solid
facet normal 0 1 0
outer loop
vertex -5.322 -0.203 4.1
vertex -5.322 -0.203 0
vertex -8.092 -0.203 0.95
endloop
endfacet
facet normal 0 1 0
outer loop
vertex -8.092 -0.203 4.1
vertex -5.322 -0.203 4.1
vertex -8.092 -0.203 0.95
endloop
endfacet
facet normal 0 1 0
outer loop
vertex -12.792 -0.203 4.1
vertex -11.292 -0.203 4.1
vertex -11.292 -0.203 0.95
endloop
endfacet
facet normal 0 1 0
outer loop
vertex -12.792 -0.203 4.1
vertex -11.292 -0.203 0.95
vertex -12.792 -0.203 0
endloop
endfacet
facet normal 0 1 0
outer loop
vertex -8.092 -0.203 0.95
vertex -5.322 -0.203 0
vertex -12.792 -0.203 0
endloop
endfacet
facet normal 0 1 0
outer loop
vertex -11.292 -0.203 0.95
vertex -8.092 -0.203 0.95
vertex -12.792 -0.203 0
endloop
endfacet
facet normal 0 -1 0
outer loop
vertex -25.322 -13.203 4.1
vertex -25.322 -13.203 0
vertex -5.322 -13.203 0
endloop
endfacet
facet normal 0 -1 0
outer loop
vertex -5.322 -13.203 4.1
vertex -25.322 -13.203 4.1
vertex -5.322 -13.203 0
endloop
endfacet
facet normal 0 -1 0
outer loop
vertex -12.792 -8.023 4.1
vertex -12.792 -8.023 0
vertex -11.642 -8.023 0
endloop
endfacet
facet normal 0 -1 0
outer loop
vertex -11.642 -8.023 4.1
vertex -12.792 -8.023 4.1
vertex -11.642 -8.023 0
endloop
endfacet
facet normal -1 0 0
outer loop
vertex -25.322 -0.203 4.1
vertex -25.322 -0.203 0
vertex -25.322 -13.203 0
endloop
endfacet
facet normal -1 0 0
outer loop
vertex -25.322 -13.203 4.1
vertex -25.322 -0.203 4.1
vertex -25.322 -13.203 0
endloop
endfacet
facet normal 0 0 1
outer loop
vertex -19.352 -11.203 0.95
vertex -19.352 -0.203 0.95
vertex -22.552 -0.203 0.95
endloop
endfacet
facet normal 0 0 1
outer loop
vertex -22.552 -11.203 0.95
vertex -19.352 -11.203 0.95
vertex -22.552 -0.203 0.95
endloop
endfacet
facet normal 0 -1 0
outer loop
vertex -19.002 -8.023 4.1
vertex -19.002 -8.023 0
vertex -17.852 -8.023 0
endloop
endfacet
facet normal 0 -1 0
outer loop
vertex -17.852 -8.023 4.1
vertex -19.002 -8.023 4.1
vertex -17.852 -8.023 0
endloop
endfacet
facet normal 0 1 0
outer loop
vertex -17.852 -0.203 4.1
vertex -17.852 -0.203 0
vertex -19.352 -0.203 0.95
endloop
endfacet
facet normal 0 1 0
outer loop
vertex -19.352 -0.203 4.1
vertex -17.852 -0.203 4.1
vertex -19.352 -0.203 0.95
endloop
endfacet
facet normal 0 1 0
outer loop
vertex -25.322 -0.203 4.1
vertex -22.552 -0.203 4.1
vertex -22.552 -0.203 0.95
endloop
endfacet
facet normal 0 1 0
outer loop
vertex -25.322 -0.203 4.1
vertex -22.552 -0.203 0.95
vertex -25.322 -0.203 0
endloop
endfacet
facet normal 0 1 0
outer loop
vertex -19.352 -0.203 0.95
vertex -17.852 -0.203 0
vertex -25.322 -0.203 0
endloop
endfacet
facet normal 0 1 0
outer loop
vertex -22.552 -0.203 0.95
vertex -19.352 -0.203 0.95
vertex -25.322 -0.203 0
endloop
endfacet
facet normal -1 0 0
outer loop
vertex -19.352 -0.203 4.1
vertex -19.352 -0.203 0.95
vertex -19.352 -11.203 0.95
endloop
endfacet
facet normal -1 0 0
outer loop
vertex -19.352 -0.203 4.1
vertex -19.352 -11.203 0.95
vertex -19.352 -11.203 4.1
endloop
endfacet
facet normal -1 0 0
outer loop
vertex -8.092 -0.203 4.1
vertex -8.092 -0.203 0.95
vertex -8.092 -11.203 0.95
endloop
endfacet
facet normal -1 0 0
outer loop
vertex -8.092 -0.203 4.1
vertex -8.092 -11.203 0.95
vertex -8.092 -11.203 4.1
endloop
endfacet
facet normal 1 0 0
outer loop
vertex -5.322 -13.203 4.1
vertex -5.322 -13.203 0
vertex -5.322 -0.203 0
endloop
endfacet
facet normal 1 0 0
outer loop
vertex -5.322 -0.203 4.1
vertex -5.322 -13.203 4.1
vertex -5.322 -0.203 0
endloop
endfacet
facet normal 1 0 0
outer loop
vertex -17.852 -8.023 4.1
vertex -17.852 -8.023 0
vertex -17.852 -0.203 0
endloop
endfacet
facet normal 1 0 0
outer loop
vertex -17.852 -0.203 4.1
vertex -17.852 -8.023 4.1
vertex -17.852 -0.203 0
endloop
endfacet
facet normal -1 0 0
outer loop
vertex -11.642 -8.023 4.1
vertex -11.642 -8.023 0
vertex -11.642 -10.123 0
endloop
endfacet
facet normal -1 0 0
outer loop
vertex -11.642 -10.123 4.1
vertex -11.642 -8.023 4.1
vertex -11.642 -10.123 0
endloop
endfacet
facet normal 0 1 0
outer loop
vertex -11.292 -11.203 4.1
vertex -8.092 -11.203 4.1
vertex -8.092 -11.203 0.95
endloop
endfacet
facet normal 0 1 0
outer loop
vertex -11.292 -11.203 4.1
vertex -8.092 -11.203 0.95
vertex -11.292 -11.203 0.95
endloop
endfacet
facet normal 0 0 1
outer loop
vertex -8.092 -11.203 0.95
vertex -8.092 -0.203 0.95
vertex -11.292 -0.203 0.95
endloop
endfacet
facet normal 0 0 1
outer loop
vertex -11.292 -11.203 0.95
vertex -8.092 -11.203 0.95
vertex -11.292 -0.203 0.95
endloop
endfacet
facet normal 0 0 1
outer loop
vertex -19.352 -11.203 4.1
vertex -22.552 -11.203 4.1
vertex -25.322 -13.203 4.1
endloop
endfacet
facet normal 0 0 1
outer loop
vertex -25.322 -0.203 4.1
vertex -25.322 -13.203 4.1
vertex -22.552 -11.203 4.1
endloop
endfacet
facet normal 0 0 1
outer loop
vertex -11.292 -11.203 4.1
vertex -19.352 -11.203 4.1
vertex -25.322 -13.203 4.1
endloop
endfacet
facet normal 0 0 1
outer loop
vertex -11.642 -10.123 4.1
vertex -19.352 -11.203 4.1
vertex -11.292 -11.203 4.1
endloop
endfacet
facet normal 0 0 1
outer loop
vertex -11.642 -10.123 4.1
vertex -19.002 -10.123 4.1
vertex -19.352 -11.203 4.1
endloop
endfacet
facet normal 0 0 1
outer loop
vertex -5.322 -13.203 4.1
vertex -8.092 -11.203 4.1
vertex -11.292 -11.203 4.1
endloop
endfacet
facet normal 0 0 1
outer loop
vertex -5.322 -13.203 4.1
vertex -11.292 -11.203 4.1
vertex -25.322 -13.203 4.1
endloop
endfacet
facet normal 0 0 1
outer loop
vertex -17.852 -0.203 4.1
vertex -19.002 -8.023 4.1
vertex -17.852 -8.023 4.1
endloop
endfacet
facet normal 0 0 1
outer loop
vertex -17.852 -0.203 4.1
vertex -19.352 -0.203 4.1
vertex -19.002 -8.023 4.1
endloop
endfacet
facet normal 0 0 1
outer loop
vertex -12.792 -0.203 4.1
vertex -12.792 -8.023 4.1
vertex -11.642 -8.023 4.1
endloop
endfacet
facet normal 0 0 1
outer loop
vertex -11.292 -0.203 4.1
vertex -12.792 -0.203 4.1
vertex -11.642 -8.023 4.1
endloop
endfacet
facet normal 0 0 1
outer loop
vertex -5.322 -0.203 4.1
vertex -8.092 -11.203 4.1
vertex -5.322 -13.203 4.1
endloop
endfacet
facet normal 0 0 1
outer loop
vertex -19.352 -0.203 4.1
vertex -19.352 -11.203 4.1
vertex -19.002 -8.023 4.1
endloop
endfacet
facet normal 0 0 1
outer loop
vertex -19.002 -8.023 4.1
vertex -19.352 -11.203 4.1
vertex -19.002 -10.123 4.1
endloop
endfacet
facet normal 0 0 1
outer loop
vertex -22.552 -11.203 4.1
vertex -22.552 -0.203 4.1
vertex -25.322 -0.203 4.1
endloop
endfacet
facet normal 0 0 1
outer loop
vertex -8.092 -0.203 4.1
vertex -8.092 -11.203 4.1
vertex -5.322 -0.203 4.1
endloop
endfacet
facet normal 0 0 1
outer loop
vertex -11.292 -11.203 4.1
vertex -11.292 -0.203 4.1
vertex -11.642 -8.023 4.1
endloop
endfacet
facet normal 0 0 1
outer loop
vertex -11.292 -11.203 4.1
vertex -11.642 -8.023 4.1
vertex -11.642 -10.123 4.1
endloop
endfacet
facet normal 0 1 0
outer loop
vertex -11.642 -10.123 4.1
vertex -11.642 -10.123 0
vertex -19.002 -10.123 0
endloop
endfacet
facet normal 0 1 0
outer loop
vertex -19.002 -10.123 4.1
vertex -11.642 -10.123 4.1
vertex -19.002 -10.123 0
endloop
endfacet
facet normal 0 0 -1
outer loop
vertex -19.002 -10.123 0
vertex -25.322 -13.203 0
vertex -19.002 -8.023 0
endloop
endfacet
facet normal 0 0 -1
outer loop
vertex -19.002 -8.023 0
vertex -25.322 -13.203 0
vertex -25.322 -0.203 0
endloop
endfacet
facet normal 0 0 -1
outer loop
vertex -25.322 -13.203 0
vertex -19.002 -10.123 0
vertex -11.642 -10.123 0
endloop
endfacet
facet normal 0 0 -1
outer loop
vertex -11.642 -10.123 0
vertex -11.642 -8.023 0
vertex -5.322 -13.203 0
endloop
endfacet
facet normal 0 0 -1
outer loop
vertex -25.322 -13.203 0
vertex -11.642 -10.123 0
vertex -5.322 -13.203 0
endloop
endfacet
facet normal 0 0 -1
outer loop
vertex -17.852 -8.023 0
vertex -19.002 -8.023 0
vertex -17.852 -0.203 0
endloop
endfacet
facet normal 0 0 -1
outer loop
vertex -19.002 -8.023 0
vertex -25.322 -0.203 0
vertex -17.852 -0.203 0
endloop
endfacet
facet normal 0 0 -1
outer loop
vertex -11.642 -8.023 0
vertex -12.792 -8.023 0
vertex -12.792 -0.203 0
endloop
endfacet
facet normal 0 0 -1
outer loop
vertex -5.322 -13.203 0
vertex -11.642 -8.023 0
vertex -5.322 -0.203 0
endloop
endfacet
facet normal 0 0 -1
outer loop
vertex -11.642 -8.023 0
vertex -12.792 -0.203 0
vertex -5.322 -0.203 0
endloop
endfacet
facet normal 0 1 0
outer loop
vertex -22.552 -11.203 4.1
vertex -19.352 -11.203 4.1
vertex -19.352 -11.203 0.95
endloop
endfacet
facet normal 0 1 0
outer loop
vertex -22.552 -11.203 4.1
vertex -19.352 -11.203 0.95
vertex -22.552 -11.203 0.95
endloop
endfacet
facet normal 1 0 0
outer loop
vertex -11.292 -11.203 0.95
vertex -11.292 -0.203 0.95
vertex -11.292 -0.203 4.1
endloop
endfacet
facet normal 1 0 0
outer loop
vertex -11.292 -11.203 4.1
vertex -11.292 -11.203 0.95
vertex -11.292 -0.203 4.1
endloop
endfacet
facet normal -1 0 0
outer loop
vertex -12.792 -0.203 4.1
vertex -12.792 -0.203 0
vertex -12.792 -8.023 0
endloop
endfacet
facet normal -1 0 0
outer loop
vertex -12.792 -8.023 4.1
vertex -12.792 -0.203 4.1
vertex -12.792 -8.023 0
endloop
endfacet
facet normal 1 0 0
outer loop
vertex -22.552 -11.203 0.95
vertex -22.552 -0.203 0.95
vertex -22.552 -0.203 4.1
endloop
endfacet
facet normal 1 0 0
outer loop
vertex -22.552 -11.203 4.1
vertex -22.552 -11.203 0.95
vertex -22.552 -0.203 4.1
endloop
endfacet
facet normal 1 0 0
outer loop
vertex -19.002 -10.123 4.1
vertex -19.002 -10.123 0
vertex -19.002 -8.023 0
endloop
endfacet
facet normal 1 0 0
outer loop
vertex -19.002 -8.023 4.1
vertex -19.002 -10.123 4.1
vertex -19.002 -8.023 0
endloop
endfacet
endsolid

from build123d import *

# Parameters (mm, degrees)
F1_DEPTH = 5.1
F2_W     = 3.2
F2_H     = 3.2
F4_DEPTH = 11
F3_W     = 3.2
F3_H     = 3.2
F5_DEPTH = 11
F6_DEPTH = 1


# Not quite as in the source:
# - a feature names something its author has since deleted; it is built from what else it names


with BuildPart() as f1:
    # F0 (on Top) → F1 (new body)
    with BuildSketch(Plane.XY):
        Polygon((-17.8524617243, -0.2032842353), (-25.3224617243, -0.2032842353), (-25.3224617243, -13.2032842353), (-5.3224617243, -13.2032842353), (-5.3224617243, -0.2032842353), (-12.7924617243, -0.2032842353), (-12.7924617243, -8.0232842353), (-11.6424617243, -8.0232842353), (-11.6424617243, -10.1232842353), (-19.0024617243, -10.1232842353), (-19.0024617243, -8.0232842353), (-17.8524617243, -8.0232842353), align=None)
    extrude(amount=F1_DEPTH)

    # F2 (on face) → F4 (cut)
    with BuildSketch(Plane(origin=(0, -0.2032842353, 0), x_dir=(-1, 0, 0), z_dir=(0, 1, 0))):
        with Locations((9.6924617243, 2.55)):
            Rectangle(F2_W, F2_H)
    extrude(amount=-F4_DEPTH, mode=Mode.SUBTRACT)

    # F3 (on face) → F5 (cut)
    with BuildSketch(Plane(origin=(0, -0.2032842353, 0), x_dir=(-1, 0, 0), z_dir=(0, 1, 0))):
        with Locations((20.9524617243, 2.55)):
            Rectangle(F3_W, F3_H)
    extrude(amount=-F5_DEPTH, mode=Mode.SUBTRACT)

    # F6 (cut): a face of the model
    f6_faces = [f1.faces().sort_by_distance(p)[0] for p in [
        (-19.2409989331, -9.0732842353, 5.1),
    ]]
    extrude(f6_faces, amount=-F6_DEPTH, mode=Mode.SUBTRACT)


solid = f1.part
